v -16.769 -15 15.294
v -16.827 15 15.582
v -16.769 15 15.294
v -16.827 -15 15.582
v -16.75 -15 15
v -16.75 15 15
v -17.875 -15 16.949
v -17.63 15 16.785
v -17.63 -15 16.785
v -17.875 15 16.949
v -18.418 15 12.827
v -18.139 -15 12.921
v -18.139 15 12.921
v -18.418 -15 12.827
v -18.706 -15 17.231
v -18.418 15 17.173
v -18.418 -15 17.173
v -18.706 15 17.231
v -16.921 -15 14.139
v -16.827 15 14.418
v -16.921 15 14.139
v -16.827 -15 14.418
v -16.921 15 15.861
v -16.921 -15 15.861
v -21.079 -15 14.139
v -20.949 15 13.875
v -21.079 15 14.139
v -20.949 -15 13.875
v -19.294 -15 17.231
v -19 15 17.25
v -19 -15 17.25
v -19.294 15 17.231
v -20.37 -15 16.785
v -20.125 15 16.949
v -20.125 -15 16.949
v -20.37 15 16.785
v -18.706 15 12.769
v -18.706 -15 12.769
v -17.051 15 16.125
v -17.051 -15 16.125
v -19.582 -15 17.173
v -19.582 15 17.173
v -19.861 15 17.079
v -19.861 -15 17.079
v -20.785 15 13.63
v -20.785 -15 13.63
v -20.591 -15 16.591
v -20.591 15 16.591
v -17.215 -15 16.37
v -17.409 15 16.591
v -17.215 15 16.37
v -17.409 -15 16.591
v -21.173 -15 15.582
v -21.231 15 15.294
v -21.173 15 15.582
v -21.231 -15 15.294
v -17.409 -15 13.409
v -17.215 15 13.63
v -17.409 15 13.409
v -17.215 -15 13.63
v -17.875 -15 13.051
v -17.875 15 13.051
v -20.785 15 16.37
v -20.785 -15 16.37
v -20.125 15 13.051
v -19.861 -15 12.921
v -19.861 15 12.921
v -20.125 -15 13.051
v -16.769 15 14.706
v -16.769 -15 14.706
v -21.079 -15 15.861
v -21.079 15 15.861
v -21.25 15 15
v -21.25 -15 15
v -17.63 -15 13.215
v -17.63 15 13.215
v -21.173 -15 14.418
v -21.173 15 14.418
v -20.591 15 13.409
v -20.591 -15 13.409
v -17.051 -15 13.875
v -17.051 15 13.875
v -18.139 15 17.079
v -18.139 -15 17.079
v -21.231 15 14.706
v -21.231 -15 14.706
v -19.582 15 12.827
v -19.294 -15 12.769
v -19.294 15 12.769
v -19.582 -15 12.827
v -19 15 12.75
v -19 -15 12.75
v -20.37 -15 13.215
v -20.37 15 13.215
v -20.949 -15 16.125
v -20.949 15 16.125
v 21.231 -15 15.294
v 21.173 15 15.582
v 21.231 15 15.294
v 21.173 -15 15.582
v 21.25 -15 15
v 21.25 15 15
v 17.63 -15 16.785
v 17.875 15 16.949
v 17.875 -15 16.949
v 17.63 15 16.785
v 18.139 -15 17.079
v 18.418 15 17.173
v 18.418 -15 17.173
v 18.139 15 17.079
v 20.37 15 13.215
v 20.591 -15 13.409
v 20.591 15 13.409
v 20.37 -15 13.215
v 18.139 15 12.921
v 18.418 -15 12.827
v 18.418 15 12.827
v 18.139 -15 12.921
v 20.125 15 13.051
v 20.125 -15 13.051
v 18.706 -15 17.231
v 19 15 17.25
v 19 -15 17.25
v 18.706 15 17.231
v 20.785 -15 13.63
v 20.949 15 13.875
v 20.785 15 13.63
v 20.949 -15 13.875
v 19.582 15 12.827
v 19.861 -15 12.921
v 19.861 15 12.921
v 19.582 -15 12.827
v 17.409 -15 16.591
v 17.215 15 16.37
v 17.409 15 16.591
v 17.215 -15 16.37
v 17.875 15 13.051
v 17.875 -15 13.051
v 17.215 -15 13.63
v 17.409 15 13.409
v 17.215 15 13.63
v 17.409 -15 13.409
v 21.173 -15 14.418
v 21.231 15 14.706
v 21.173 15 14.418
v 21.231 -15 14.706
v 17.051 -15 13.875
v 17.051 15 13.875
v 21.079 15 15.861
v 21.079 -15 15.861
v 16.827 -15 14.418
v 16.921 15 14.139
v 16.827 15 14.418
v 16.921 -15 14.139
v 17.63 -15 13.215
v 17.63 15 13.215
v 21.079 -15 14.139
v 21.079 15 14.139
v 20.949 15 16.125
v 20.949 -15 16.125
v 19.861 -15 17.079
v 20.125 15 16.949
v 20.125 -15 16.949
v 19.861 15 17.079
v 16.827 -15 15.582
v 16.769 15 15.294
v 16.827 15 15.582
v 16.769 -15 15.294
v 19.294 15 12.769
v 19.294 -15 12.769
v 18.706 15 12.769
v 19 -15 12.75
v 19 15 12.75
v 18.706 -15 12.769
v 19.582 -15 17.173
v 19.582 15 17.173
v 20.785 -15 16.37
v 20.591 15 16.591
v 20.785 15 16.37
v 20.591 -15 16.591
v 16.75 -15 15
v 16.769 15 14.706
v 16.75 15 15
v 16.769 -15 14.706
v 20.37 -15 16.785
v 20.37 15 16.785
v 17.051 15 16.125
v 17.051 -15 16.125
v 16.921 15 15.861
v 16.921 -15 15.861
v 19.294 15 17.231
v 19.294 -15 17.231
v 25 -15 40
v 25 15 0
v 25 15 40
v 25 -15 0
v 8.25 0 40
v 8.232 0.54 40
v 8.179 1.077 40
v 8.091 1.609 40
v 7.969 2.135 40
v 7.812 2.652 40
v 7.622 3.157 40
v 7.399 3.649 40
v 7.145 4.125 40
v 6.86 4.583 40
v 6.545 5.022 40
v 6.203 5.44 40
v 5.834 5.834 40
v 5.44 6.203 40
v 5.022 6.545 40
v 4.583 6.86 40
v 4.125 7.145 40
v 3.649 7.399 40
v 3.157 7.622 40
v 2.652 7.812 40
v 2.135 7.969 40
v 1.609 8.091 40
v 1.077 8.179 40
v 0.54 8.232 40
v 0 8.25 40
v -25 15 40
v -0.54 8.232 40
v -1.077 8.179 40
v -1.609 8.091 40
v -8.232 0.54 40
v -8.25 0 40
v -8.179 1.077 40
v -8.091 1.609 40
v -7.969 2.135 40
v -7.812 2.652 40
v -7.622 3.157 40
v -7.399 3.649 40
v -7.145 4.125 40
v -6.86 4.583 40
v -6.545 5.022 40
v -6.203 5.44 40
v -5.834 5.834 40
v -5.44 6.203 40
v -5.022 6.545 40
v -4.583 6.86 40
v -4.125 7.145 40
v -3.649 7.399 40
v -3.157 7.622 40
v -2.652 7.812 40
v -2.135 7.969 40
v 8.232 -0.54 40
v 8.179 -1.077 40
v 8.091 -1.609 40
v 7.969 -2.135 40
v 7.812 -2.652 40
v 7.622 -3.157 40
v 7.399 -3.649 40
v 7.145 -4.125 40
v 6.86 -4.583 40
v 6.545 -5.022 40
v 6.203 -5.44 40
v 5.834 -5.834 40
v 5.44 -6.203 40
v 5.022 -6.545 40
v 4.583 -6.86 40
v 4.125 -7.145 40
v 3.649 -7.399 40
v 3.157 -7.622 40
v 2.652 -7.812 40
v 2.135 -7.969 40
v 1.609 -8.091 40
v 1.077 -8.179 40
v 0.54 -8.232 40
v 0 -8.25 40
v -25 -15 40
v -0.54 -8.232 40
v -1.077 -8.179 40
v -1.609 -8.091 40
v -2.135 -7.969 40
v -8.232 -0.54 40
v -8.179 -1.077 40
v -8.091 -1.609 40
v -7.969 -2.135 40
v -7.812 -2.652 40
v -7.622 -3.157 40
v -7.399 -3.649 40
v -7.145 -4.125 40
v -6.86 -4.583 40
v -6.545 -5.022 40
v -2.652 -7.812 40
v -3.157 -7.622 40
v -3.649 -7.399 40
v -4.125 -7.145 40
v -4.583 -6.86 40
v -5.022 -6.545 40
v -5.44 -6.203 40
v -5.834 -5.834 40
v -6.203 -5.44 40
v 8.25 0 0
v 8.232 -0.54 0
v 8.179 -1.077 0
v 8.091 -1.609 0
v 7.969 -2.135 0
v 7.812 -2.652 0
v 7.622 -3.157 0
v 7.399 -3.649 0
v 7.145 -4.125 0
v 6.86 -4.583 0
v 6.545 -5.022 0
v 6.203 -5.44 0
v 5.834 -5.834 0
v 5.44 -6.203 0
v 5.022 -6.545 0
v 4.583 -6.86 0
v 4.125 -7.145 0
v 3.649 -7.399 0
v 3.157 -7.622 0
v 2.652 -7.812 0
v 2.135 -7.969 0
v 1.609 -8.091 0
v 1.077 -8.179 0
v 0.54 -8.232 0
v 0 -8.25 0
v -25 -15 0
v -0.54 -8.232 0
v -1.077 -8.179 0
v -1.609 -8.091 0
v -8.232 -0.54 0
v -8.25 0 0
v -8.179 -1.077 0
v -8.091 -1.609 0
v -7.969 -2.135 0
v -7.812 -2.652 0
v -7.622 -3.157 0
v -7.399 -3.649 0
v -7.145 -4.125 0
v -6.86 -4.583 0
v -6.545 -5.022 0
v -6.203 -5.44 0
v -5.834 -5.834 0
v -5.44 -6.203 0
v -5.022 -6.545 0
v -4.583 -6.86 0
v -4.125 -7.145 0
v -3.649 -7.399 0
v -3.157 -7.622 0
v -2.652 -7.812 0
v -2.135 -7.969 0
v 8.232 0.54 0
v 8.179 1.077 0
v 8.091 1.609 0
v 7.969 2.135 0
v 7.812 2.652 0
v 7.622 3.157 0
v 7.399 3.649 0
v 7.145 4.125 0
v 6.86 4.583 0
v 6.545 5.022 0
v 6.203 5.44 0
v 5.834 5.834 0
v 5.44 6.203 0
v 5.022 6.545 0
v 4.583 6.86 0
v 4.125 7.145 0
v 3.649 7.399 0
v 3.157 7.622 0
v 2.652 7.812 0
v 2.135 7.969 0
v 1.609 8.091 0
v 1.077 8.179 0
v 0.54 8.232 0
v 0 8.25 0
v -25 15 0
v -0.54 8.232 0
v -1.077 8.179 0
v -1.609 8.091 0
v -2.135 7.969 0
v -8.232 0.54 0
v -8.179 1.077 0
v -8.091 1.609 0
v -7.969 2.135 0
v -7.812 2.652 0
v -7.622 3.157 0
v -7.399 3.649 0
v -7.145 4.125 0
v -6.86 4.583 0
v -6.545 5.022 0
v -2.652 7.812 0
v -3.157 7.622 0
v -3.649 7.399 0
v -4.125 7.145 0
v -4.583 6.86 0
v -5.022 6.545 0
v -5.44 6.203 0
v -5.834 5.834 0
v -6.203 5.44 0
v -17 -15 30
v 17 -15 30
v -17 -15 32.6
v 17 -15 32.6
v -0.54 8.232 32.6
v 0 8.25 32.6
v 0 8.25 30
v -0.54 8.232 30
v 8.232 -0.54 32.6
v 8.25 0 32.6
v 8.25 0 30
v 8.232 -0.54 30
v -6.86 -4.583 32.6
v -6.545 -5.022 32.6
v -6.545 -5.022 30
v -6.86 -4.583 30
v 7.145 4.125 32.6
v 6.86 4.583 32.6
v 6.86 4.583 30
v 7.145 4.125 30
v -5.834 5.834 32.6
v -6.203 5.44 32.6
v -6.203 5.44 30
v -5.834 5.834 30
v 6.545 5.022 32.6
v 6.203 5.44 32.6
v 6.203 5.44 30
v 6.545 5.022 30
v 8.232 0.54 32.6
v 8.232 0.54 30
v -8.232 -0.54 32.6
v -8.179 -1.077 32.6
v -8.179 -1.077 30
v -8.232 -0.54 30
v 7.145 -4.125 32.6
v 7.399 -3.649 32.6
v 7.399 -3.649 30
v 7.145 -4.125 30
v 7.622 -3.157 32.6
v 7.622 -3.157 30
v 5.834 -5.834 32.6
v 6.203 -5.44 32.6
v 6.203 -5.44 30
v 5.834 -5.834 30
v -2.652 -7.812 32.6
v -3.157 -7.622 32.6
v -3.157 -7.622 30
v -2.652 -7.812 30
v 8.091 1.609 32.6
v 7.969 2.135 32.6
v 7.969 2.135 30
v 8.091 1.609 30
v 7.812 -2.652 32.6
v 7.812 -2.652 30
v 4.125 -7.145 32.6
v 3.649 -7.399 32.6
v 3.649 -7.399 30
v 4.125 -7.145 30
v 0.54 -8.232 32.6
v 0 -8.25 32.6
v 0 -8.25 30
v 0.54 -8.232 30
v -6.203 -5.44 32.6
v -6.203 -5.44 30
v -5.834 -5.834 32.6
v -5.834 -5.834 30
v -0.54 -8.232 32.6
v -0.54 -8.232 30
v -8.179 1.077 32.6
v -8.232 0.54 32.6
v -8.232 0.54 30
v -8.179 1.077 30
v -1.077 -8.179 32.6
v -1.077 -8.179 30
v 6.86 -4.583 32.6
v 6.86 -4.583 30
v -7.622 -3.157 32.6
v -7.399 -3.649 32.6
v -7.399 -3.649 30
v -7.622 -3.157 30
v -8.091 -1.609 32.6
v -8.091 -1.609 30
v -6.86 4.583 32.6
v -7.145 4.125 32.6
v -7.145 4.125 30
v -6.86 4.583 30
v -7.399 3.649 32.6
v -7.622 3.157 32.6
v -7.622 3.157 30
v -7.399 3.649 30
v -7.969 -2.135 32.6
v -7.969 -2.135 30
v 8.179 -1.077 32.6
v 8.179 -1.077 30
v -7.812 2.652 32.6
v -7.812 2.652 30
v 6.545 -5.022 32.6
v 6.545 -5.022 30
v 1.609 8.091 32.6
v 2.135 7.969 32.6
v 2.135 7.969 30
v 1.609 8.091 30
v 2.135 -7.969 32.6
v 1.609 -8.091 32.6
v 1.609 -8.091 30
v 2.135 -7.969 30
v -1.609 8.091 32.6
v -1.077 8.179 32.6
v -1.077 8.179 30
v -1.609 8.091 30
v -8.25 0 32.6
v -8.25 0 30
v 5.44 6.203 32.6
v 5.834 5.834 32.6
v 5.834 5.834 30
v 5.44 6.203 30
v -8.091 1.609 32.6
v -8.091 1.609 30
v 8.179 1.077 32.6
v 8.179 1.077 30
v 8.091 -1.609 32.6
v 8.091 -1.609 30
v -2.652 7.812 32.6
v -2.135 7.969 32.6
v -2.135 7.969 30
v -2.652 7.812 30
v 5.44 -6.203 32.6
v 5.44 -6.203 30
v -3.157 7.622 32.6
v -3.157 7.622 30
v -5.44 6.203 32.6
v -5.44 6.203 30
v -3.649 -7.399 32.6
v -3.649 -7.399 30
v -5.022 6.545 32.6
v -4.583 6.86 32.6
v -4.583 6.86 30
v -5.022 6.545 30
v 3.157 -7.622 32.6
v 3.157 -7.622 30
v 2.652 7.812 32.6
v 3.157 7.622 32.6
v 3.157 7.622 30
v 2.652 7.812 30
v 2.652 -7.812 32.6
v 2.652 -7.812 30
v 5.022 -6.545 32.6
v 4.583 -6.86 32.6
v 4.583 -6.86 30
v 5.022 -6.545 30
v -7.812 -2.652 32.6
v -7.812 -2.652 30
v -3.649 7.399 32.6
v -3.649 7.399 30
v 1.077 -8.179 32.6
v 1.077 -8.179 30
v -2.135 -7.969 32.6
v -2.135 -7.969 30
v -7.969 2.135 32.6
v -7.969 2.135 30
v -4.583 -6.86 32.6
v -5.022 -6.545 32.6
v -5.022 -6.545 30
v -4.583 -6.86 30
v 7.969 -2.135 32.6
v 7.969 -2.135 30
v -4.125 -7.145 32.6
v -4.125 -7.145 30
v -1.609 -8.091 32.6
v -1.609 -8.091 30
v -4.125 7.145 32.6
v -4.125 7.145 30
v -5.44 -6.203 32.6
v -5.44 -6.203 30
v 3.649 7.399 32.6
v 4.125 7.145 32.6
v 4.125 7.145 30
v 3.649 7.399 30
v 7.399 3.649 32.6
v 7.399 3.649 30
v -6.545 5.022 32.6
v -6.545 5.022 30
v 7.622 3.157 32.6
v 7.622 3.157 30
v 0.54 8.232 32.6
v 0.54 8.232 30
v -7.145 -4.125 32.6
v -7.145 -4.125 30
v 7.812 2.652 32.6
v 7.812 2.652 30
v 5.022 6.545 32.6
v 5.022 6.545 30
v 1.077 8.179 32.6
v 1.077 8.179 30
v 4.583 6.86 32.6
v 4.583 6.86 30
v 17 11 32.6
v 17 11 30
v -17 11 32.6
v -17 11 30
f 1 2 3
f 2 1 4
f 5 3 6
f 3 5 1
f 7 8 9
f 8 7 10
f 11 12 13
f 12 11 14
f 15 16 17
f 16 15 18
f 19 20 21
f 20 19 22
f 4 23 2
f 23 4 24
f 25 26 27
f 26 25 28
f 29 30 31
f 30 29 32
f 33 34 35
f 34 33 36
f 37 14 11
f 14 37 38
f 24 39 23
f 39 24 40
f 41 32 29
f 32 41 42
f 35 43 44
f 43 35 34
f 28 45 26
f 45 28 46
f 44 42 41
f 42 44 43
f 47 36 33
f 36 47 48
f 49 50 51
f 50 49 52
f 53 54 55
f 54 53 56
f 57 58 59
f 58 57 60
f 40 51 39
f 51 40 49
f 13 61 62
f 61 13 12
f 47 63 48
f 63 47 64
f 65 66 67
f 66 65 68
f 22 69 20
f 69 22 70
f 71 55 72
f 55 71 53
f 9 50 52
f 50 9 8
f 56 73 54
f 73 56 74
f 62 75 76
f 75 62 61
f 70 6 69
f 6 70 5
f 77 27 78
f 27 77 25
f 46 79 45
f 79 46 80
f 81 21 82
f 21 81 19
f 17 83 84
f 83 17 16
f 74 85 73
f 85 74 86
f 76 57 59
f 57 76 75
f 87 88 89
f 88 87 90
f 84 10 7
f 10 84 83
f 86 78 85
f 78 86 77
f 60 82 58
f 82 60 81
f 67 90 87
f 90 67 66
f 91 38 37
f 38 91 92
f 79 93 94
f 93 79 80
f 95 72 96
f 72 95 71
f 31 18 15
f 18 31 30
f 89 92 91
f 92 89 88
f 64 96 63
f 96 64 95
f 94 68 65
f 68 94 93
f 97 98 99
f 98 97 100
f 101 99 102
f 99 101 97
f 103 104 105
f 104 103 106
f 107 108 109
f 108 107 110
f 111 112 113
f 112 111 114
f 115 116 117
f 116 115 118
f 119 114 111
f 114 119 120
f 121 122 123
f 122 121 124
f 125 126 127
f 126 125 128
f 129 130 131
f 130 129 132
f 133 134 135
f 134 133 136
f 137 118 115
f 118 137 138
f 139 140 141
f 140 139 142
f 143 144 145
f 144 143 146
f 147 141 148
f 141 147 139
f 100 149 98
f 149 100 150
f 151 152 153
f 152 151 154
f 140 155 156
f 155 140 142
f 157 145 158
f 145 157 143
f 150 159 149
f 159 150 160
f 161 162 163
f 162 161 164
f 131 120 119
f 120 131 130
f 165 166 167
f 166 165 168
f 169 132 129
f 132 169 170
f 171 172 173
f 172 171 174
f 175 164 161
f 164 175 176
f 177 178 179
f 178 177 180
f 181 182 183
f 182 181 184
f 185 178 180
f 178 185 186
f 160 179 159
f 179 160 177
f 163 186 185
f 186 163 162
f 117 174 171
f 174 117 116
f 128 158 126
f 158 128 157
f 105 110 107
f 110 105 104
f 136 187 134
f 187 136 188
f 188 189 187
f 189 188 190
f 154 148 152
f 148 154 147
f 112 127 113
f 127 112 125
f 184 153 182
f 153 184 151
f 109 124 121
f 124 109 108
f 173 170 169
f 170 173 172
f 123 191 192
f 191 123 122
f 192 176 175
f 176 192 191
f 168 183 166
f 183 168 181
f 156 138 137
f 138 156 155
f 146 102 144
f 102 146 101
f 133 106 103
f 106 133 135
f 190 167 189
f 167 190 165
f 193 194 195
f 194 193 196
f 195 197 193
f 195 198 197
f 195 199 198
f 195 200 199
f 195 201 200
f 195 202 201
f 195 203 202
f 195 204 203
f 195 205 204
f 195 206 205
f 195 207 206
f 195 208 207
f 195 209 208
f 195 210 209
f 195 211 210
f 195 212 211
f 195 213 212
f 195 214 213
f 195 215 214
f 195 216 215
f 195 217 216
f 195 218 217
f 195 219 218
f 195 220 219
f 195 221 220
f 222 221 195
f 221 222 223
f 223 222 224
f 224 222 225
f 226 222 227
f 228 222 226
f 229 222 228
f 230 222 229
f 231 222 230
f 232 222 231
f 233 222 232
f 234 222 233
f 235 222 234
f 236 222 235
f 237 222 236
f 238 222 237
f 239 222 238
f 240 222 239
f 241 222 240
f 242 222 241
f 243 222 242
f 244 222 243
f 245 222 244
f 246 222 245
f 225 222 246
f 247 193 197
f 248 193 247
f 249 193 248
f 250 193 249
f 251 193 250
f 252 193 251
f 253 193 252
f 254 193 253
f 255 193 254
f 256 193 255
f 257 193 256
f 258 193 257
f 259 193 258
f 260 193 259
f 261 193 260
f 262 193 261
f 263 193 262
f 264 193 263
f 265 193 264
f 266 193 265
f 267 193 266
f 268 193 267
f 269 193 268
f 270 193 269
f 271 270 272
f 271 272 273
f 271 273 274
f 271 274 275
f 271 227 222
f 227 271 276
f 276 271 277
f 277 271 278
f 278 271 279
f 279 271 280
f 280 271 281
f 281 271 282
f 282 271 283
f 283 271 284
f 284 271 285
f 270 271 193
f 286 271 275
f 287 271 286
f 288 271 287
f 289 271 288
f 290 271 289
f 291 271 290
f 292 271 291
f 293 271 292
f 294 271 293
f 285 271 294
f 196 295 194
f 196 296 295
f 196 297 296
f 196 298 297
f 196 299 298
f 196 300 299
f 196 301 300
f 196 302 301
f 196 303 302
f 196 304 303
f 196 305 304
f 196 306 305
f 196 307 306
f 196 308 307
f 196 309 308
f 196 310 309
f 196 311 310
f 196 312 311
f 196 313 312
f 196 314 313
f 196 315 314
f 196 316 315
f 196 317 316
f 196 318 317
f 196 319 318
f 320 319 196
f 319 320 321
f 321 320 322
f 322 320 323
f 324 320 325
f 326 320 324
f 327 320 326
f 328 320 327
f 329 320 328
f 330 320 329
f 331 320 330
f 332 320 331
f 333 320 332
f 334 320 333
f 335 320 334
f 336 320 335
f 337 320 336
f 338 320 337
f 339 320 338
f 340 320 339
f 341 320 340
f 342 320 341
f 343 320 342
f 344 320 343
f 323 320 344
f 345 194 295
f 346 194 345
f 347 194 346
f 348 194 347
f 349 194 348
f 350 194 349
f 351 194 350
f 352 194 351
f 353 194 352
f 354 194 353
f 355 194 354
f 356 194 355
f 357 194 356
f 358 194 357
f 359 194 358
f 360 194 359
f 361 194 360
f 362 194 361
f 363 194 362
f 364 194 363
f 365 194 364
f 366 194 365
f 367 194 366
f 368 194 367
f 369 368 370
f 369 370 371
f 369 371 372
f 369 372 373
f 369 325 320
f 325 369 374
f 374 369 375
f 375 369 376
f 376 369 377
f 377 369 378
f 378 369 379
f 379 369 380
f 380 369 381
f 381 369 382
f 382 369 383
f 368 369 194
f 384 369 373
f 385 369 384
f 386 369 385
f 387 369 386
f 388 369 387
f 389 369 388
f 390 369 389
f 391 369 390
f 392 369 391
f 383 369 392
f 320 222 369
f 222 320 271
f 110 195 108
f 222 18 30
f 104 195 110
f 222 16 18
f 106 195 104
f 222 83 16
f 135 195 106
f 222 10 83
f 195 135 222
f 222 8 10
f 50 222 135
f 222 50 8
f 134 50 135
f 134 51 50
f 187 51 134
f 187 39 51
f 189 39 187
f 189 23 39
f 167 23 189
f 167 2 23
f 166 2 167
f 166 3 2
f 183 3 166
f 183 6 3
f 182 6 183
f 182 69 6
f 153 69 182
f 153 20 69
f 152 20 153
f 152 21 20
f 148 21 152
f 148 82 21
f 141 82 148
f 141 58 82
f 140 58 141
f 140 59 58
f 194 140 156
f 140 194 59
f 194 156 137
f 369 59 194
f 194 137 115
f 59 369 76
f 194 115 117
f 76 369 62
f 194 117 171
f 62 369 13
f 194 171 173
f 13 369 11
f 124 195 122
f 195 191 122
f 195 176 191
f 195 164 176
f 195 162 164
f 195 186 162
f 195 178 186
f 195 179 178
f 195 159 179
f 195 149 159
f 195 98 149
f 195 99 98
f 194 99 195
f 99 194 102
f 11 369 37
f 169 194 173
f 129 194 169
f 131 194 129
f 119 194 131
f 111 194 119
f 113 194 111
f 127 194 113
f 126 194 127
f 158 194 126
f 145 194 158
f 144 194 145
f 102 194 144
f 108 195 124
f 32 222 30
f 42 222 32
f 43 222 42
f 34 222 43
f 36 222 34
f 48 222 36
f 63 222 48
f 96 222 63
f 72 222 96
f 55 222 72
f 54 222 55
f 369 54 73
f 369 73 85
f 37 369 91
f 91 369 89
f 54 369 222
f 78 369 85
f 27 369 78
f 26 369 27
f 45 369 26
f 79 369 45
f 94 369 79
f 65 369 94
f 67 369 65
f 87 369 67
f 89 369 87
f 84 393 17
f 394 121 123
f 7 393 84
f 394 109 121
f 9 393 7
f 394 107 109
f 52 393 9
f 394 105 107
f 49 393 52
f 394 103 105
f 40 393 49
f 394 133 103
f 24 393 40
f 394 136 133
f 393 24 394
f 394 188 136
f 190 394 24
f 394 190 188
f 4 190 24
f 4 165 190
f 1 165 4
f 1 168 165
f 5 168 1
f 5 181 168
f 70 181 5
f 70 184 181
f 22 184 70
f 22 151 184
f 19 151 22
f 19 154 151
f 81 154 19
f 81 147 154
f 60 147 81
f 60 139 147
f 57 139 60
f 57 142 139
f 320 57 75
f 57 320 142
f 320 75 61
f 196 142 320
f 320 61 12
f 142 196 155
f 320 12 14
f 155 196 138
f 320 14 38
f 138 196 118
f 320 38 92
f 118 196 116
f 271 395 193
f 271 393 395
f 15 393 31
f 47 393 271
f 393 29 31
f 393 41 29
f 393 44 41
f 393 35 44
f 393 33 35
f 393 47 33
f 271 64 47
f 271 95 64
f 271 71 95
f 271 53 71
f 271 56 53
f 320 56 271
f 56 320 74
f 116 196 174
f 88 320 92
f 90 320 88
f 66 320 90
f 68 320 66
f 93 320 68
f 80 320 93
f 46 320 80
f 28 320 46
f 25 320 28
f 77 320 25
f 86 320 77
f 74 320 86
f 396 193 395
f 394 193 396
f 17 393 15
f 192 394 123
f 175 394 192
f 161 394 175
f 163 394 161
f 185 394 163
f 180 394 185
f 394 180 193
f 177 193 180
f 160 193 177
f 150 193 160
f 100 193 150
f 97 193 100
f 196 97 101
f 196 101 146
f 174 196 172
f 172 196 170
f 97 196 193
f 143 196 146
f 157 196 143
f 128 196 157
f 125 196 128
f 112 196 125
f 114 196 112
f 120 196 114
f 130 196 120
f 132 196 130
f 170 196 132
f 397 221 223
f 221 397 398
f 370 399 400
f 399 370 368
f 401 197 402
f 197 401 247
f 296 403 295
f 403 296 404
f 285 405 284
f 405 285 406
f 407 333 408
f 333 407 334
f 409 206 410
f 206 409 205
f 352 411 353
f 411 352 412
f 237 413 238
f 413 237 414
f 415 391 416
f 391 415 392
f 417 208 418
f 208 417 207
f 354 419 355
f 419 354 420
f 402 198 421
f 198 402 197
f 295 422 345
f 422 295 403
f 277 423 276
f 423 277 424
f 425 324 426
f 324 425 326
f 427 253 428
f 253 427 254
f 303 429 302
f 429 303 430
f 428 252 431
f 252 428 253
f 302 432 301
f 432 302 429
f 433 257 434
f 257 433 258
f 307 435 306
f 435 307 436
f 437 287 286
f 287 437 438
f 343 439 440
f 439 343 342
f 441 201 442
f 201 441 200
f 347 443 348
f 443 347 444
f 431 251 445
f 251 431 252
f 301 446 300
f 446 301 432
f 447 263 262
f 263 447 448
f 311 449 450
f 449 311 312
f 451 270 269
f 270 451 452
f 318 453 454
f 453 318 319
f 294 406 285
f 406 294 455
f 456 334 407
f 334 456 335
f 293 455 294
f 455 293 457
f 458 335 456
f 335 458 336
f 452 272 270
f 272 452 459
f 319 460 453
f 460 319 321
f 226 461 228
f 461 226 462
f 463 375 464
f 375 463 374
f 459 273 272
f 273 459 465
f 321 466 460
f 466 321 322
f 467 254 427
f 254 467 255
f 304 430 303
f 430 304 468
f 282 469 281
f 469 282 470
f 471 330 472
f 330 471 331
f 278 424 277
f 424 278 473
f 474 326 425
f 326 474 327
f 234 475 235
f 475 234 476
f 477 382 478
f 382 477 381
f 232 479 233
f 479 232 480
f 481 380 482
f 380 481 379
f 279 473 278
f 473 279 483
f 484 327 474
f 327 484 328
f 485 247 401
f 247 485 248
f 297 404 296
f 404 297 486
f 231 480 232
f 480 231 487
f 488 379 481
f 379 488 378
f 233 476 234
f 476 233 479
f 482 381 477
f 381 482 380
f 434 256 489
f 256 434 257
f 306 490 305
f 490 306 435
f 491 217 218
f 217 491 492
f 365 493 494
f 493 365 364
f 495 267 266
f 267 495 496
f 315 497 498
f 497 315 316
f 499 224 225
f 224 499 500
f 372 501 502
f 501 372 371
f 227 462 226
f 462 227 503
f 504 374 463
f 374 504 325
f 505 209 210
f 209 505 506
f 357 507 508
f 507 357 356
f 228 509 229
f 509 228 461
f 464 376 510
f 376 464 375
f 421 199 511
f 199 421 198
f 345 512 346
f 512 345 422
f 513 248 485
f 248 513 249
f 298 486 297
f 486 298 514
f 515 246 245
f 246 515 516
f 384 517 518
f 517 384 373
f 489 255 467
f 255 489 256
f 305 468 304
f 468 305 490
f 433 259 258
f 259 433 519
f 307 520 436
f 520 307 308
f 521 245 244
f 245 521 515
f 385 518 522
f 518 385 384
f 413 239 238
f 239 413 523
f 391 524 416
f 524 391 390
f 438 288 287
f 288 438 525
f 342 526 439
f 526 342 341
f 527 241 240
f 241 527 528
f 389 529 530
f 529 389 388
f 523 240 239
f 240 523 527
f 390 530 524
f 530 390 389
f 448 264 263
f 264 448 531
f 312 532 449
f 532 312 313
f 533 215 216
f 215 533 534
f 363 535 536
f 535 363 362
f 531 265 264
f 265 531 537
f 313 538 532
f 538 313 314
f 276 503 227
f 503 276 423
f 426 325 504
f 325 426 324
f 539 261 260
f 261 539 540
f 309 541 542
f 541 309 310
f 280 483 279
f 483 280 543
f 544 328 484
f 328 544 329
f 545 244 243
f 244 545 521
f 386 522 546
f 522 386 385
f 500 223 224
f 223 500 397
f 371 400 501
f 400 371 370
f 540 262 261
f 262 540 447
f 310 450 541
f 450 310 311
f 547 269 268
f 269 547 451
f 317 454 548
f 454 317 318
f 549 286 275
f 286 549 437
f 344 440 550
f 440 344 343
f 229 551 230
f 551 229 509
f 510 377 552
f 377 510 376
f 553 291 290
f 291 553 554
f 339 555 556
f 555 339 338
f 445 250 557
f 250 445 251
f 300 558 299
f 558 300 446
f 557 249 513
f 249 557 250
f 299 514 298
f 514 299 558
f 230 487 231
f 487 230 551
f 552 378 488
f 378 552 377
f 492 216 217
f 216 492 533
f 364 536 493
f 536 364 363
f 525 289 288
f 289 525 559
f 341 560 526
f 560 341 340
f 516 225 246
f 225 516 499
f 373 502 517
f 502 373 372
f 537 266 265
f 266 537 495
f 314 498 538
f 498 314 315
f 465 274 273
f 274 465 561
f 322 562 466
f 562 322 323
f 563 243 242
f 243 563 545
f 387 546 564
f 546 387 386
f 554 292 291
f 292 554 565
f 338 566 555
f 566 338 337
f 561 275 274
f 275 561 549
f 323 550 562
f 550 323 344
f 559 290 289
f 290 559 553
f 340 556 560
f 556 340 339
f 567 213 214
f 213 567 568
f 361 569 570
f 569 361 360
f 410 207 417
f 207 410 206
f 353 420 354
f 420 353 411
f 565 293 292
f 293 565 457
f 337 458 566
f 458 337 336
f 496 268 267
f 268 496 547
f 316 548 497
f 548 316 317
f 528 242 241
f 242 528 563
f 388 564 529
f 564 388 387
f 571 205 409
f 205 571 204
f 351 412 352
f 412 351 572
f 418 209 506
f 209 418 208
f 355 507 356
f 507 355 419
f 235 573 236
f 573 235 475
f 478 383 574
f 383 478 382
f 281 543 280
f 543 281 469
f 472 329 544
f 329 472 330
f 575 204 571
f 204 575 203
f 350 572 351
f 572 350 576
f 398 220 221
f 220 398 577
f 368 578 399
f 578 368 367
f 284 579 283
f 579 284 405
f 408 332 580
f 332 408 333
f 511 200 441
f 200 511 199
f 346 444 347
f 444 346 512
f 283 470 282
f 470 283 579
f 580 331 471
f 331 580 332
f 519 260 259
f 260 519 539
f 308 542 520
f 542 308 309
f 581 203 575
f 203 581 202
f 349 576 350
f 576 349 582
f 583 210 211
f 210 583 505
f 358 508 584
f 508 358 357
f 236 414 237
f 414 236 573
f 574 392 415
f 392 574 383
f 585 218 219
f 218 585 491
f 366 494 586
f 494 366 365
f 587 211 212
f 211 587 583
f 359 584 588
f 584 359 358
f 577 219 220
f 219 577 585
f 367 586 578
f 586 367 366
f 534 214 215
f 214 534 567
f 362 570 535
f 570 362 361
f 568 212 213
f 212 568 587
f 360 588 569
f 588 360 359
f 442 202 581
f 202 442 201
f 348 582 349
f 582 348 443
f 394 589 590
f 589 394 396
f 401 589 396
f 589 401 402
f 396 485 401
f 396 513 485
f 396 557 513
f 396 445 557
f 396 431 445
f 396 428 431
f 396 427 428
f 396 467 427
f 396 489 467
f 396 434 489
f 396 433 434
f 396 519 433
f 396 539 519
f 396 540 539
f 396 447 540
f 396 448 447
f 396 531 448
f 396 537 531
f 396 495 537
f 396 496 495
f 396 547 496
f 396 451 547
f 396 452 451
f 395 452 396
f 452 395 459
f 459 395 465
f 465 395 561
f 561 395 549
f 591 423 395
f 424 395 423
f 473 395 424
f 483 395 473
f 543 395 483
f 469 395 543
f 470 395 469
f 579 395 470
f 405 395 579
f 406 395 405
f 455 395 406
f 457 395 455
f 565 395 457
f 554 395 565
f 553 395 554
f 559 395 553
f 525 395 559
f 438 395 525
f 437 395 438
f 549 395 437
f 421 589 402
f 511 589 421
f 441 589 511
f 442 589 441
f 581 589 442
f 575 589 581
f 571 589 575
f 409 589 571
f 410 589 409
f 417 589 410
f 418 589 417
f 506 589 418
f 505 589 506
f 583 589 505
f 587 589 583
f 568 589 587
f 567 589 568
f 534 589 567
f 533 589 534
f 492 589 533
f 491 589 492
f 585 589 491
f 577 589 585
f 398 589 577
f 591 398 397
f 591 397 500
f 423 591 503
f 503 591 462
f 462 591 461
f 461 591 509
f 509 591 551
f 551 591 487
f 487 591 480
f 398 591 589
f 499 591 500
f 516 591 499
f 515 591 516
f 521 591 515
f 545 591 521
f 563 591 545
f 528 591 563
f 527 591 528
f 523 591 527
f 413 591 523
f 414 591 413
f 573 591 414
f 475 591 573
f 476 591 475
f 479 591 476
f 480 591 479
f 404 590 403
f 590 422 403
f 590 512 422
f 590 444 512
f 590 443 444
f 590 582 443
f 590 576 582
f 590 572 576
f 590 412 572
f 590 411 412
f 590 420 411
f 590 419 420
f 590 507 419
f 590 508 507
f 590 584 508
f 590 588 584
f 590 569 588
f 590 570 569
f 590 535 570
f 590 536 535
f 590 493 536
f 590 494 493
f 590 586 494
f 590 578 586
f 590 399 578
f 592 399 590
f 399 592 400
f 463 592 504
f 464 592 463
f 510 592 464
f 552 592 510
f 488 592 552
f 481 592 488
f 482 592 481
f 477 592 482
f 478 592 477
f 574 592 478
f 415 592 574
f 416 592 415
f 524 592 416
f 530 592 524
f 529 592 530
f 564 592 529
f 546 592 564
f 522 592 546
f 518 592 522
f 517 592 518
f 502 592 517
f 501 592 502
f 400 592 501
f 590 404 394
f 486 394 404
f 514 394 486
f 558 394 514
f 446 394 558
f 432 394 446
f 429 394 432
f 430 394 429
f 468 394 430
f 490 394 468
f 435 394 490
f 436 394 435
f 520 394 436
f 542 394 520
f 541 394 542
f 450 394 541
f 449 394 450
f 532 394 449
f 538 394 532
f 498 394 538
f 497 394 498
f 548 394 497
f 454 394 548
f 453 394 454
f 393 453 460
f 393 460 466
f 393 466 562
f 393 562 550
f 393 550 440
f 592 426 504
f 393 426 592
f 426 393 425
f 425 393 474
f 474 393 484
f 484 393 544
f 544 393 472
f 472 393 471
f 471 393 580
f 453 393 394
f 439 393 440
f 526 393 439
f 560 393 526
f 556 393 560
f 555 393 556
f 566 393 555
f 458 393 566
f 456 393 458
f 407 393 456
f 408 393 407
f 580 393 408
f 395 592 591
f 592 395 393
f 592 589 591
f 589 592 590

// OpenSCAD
// KNOWN-WRONG PART (must fail): the barrel channel is a closed 16.5 mm hole, not open to the front
// Wall-mounted holder for a 10 mL syringe hanging upright, tip down (gravity-feed reservoir)
// Category: hardware. A block with a vertical U-shaped barrel channel open at the front, a
// horizontal slot that takes the finger flange, and two M4 wall-screw holes from front to back.
// Print: PETG or PLA, standing on its bottom face; the flange slot roof bridges 34 mm.
// SPDX-License-Identifier: CERN-OHL-P-2.0

/* [Holder] */
block = [50, 30, 40];     // X (width), Y (depth), Z (height) [mm]; back face at y = +15
channel_w = 16.5;         // 16 mm barrel + clearance; half-circle back end centred at (0, 0)
slot = [34, 2.6];         // flange slot width (X) and height (Z)
slot_z = 30;              // slot from z = 30 to 32.6
slot_back_y = 11;         // the slot reaches from the front face back to y = 11
screw_d = 4.5;            // M4 clearance
screw_x = 19;
screw_z = 15;

/* [Hidden] */
eps = 0.01;

difference() {
    translate([-block.x / 2, -block.y / 2, 0]) cube(block);
    // barrel channel, open toward -Y (the front)
    translate([0, 0, -1]) linear_extrude(block.z + 2) {
        circle(d = channel_w, $fn = 96);
    }
    // flange slot, cut in from the front face
    translate([-slot.x / 2, -block.y / 2 - 1, slot_z]) cube([slot.x, slot_back_y + block.y / 2 + 1, slot.y]);
    // wall-screw holes, front to back
    for (s = [-1, 1])
        translate([s * screw_x, 0, screw_z]) rotate([90, 0, 0])
            cylinder(d = screw_d, h = block.y + 2, center = true, $fn = 48);
}
